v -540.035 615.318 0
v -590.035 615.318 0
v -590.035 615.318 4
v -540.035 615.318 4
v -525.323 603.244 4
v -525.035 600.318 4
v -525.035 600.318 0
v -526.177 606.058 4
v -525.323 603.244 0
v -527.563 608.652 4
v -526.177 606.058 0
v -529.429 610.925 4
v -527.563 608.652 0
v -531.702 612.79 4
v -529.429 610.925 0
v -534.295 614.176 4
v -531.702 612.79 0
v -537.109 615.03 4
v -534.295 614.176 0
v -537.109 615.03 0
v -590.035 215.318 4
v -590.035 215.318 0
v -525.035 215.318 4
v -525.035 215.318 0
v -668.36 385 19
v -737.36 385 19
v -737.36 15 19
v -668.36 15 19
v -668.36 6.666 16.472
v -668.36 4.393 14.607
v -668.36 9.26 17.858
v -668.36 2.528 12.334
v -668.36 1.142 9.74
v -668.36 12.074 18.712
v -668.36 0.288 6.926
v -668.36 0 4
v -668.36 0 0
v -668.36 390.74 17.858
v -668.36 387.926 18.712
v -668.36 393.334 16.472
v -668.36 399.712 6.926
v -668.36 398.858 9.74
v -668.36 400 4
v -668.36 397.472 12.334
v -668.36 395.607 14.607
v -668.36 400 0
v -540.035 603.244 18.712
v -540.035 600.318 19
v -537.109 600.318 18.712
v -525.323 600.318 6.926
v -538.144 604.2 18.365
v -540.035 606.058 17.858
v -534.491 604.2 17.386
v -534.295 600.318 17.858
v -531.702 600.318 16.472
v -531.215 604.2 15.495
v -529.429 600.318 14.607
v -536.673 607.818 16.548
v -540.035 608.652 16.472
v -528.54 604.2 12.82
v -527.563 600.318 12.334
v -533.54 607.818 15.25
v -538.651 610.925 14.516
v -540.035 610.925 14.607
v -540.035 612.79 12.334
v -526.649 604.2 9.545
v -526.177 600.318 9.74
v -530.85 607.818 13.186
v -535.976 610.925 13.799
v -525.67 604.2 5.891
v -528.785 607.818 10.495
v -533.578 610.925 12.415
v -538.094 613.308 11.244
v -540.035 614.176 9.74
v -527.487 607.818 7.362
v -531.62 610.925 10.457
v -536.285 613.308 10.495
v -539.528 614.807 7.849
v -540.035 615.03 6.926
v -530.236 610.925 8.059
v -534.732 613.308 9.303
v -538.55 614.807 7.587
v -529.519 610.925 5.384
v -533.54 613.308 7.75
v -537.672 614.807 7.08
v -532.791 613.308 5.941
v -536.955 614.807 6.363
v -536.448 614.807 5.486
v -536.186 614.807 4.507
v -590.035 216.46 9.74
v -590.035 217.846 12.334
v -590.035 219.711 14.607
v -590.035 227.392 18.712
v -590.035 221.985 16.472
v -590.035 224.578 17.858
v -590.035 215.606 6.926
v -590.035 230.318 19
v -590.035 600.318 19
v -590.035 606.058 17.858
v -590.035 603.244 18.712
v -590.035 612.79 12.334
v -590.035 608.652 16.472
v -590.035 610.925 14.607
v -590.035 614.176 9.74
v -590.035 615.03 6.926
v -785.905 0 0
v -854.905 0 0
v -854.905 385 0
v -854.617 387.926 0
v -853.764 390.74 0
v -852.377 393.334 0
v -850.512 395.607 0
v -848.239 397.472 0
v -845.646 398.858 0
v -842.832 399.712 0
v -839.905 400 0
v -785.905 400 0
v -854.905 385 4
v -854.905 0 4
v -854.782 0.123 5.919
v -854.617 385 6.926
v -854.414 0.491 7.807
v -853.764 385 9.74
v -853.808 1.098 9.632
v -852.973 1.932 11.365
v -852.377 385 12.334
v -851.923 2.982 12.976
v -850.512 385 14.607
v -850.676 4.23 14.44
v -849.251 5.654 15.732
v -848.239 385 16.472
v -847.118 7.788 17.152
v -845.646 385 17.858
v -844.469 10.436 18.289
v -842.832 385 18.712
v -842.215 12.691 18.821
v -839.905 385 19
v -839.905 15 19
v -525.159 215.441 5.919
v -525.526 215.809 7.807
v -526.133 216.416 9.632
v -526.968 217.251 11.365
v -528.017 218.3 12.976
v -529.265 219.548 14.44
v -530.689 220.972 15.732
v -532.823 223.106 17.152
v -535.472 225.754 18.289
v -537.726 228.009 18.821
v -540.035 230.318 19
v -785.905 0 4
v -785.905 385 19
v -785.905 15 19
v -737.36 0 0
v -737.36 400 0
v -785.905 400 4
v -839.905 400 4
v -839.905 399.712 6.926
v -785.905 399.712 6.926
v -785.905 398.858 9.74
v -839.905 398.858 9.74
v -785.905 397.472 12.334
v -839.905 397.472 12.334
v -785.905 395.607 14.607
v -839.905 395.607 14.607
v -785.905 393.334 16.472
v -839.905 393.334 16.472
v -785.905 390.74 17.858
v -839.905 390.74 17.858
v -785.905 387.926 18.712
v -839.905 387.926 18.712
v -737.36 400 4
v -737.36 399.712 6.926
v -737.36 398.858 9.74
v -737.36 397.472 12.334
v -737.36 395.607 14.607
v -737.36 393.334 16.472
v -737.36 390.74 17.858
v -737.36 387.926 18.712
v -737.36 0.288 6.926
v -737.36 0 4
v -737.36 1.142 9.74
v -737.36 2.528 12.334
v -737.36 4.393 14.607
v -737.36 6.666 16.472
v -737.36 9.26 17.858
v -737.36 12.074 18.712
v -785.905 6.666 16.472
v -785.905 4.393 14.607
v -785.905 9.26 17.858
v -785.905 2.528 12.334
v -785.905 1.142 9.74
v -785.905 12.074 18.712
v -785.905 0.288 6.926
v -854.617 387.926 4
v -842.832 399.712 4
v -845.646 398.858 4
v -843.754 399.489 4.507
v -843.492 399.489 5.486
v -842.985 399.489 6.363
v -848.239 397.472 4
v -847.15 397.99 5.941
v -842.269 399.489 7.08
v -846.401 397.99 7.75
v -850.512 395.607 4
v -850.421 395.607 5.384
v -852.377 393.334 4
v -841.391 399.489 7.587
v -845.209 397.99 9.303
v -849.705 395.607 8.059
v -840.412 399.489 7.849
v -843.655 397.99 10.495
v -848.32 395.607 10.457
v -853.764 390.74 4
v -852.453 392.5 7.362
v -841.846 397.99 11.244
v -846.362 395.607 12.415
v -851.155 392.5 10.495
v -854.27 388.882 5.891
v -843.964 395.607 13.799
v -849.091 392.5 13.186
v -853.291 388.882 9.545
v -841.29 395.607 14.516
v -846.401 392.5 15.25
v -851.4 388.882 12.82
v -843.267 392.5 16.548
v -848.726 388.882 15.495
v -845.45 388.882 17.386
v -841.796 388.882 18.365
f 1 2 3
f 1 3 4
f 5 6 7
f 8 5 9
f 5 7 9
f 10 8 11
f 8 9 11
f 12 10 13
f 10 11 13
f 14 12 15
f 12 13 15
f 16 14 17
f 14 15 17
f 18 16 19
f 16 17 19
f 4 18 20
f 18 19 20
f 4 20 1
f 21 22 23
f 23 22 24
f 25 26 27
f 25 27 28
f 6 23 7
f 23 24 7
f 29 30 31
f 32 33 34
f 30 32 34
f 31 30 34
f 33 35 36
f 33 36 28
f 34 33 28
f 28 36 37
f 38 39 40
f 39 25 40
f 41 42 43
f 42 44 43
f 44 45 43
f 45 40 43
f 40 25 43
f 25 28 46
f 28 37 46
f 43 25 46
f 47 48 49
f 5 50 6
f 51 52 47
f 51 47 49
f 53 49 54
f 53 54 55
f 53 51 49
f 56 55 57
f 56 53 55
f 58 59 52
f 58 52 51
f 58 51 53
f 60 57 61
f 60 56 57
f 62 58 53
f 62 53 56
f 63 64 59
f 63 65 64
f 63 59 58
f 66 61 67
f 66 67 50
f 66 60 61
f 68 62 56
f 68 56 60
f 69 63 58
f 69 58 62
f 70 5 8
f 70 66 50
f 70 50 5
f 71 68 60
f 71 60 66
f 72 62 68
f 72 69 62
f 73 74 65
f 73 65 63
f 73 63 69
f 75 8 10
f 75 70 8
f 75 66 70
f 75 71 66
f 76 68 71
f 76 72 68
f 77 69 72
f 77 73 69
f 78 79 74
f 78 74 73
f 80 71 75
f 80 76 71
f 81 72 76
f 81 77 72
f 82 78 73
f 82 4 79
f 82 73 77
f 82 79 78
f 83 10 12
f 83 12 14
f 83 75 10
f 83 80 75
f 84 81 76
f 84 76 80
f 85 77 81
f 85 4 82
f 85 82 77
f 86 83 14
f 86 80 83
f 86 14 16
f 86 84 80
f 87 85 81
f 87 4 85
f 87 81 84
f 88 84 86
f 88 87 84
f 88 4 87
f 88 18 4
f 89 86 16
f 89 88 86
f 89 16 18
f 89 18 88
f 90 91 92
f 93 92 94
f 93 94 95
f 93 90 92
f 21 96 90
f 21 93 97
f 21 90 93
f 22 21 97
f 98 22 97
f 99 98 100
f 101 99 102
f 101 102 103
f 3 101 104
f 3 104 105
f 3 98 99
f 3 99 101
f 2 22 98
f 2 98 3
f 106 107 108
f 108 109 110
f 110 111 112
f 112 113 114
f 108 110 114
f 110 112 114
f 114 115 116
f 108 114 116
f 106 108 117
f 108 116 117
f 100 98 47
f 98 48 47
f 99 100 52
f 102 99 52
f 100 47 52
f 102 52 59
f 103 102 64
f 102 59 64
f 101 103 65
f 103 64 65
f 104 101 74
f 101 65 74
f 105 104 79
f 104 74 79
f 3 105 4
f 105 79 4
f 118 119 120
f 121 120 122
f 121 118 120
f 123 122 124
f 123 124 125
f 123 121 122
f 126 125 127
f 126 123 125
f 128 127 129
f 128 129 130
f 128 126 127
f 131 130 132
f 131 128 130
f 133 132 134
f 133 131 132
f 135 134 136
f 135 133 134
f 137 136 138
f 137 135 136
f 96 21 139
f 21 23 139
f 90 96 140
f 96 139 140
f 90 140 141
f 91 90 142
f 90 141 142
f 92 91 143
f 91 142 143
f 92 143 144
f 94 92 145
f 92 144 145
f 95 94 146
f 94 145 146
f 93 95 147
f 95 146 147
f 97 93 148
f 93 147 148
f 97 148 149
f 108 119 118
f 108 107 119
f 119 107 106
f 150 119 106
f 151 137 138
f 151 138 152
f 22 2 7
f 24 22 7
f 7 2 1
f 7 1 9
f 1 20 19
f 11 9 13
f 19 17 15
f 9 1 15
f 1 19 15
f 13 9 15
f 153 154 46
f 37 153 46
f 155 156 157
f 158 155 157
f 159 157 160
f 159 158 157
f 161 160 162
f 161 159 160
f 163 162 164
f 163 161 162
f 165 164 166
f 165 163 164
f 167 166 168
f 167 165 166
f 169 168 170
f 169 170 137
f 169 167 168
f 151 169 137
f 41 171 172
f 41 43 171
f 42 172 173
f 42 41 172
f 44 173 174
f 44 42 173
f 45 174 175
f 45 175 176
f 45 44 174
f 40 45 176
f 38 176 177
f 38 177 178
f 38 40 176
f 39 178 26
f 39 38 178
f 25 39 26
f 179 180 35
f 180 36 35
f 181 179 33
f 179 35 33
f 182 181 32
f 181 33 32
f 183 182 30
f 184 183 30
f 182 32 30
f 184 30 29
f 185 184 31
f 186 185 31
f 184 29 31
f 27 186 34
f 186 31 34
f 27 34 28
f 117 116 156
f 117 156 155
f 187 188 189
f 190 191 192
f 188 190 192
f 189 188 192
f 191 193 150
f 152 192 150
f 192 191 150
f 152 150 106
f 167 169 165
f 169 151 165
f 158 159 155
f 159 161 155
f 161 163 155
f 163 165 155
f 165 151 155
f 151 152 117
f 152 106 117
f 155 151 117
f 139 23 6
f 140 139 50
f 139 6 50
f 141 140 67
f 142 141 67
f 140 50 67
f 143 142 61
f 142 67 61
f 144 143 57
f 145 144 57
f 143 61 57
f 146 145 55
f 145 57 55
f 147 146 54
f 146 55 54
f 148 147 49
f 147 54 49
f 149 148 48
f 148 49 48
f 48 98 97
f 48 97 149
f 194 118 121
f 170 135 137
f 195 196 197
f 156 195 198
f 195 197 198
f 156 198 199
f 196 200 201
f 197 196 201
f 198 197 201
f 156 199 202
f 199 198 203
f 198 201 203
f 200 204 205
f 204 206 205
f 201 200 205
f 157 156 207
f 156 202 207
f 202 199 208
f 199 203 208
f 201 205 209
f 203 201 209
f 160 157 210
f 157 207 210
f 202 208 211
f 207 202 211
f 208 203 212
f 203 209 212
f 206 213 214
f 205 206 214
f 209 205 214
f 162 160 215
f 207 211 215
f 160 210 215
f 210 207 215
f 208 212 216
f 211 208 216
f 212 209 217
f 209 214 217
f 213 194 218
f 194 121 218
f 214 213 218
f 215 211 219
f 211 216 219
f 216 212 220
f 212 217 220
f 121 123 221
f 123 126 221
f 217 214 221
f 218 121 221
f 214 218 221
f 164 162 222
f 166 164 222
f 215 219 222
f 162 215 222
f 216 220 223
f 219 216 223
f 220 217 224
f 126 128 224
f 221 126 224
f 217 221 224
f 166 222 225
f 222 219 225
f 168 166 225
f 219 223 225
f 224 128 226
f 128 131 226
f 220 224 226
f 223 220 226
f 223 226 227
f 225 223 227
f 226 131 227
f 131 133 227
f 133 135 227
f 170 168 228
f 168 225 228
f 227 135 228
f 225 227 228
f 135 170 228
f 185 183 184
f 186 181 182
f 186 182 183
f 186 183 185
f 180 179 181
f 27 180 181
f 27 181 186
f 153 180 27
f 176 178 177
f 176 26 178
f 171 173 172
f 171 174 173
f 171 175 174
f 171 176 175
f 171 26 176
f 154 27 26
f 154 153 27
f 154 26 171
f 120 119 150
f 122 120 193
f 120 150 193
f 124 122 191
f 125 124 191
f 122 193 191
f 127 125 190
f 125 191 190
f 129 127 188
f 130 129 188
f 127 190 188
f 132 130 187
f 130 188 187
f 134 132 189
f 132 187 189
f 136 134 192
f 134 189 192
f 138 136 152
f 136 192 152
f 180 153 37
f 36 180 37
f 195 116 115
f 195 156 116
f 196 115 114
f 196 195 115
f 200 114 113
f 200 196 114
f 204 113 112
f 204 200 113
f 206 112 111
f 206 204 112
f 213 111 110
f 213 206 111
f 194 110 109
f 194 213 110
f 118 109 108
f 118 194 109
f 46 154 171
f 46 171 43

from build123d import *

# Parameters (mm, degrees)
F0_W     = 69
F0_H     = 400
F3_DEPTH = 19
F1_W     = 69
F1_H     = 400
F4_DEPTH = 19
F2_W     = 65
F2_H     = 400
F5_DEPTH = 19
F6_R     = 15
F7_R     = 15
F8_R     = 15
F9_R     = 15
F10_R    = 15


with BuildPart() as f3:
    # F0 (on Top) → F3 (new body)
    with BuildSketch(Plane.XY):
        with Locations((-820.405311, 200)):
            Rectangle(F0_W, F0_H)
    extrude(amount=F3_DEPTH)

    # F6
    f6_edges = [f3.edges().sort_by_distance(p)[0] for p in [
        (-854.905311, 200, 19),
        (-820.405311, 0, 19),
    ]]
    fillet(f6_edges, radius=F6_R)

    # F10
    f10_edges = [f3.edges().sort_by_distance(p)[0] for p in [
        (-812.905311, 400, 19),
    ]]
    fillet(f10_edges, radius=F10_R)


with BuildPart() as f4:
    # F1 (on Top) → F4 (new body)
    with BuildSketch(Plane.XY):
        with Locations((-702.860493, 200)):
            Rectangle(F1_W, F1_H)
    extrude(amount=F4_DEPTH)

    # F7
    f7_edges = [f4.edges().sort_by_distance(p)[0] for p in [
        (-702.860493, 0, 19),
        (-702.860493, 400, 19),
    ]]
    fillet(f7_edges, radius=F7_R)


with BuildPart() as f5:
    # F2 (on Top) → F5 (new body)
    with BuildSketch(Plane.XY):
        with Locations((-557.535231, 415.318063)):
            Rectangle(F2_W, F2_H)
    extrude(amount=F5_DEPTH)

    # F8
    f8_edges = [f5.edges().sort_by_distance(p)[0] for p in [
        (-525.035231, 415.318063, 19),
        (-557.535231, 215.318063, 19),
    ]]
    fillet(f8_edges, radius=F8_R)

    # F9
    f9_edges = [f5.edges().sort_by_distance(p)[0] for p in [
        (-565.035231, 615.318063, 19),
    ]]
    fillet(f9_edges, radius=F9_R)


solid = Compound([f3.part, f4.part, f5.part])
